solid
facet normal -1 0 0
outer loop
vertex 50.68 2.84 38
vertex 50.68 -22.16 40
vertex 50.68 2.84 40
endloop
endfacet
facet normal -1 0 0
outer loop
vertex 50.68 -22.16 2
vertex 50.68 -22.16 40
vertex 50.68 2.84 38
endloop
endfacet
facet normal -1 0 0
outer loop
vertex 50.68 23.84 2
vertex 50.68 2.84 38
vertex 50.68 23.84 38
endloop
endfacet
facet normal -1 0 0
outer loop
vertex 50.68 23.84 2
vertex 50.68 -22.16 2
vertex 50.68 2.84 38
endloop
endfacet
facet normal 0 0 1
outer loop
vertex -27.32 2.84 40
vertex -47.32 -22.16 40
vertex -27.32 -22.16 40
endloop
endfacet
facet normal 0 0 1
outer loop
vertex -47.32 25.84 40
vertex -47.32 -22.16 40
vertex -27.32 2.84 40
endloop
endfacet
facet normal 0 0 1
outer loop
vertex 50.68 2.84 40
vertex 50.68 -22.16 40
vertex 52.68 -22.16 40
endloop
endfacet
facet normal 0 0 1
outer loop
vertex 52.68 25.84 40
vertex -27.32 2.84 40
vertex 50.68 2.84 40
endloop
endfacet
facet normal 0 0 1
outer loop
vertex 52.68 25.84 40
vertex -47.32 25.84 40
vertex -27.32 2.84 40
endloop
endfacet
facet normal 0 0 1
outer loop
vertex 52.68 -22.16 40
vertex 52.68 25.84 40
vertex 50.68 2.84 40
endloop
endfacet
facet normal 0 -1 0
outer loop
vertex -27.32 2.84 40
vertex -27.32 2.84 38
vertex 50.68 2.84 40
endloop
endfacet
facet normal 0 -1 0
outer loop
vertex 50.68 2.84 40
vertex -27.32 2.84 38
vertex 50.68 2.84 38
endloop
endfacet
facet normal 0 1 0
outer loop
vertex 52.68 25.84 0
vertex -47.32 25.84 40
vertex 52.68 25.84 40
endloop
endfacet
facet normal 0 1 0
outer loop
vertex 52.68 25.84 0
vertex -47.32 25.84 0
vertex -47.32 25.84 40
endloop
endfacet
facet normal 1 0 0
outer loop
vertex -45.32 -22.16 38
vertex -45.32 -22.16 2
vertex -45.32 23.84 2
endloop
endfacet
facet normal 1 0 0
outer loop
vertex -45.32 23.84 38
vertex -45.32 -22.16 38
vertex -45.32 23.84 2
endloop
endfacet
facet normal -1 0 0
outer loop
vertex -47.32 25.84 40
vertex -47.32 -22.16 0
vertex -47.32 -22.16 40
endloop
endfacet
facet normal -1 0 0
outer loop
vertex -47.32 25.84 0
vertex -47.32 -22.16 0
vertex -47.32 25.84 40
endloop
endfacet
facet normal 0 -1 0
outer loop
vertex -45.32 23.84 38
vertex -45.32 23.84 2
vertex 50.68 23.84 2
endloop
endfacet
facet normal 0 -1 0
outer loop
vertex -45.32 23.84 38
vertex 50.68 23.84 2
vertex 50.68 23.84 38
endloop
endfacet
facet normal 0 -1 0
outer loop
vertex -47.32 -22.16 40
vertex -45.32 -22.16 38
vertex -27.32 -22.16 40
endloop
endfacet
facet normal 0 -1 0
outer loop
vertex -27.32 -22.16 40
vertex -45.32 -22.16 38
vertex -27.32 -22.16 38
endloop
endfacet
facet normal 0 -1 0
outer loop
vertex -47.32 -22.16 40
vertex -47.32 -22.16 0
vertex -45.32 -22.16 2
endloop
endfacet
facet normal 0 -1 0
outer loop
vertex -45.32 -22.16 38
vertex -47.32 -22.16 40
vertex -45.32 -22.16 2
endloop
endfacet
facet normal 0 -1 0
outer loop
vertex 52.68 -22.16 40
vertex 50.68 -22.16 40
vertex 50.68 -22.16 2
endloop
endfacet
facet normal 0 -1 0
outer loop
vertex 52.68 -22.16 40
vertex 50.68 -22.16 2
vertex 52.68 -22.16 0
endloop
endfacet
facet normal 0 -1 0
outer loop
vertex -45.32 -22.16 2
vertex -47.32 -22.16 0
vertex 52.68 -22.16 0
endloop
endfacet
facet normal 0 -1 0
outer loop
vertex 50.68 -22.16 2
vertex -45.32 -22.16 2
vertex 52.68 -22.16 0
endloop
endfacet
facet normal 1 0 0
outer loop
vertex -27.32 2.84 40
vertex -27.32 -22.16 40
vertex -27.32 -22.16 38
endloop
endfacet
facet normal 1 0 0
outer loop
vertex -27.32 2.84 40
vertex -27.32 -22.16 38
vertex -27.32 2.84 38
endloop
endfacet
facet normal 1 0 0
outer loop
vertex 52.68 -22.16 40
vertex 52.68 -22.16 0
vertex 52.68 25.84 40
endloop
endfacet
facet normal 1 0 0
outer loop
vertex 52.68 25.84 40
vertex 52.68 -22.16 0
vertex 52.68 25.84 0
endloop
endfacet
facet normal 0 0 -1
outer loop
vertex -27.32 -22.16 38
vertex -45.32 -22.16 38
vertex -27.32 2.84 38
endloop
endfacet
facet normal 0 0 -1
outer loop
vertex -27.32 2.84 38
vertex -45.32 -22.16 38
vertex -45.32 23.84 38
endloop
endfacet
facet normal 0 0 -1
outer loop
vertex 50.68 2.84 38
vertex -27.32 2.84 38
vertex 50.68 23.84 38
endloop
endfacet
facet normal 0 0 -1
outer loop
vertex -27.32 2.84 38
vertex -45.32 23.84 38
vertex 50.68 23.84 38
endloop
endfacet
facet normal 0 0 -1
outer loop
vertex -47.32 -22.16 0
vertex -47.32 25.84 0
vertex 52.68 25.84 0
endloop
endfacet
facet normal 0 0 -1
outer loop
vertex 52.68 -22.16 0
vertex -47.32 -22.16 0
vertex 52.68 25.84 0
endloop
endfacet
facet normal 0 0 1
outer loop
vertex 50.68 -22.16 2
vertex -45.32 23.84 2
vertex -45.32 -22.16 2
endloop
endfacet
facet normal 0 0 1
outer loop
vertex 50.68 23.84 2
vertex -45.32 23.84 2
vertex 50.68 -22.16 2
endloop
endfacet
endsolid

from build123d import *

# Parameters (mm, degrees)
SKETCH1_W           = 100
SKETCH1_H           = 50
BOSS_EXTRUDE1_DEPTH = 40
SHELL1_T            = -2
SKETCH2_W           = 100
SKETCH2_H           = 40
CUT_EXTRUDE1_DEPTH  = 40
SKETCH3_W           = 96
SKETCH3_H           = 21
BOSS_EXTRUDE2_DEPTH = 38
SKETCH4_W           = 20
SKETCH4_H           = 48
BOSS_EXTRUDE3_DEPTH = 2
SHELL2_START        = -45.319513939
SHELL2_OUTLINE_W    = 21
SHELL2_OUTLINE_H    = 36
SHELL2_DEPTH        = 96


# Read off the part's stored shape, not the designer's step: Shell2
with BuildPart() as part:
    # Sketch1 → Boss-Extrude1 (new body)
    with BuildSketch(Plane.XY):
        with Locations((2.680486061, 0.839885633)):
            Rectangle(SKETCH1_W, SKETCH1_H)
    extrude(amount=BOSS_EXTRUDE1_DEPTH)

    # Shell1
    shell1_openings = [part.faces().sort_by_distance(p)[0] for p in [
        (2.680486061, 0.839885633, 40),
    ]]
    offset(amount=SHELL1_T, openings=shell1_openings, kind=Kind.INTERSECTION)

    # Sketch2 → Cut-Extrude1 (cut)
    with BuildSketch(Plane(origin=(0, -22.160114367, 0), x_dir=(1, 0, 0), z_dir=(0, 1, 0))):
        with Locations((2.680486061, -20)):
            Rectangle(SKETCH2_W, SKETCH2_H)
    extrude(amount=-CUT_EXTRUDE1_DEPTH, mode=Mode.SUBTRACT)

    # Sketch3 → Boss-Extrude2 (add)
    with BuildSketch(Plane.XY.offset(2)):
        with Locations((2.680486061, 13.339885633)):
            Rectangle(SKETCH3_W, SKETCH3_H)
    extrude(amount=BOSS_EXTRUDE2_DEPTH)

    # Sketch4 → Boss-Extrude3 (add)
    with BuildSketch(Plane.XY.offset(40)):
        with Locations((-37.319513939, 1.839885633)):
            Rectangle(SKETCH4_W, SKETCH4_H)
    extrude(amount=-BOSS_EXTRUDE3_DEPTH)

    # Shell2 outline → Shell2 (cut)
    with BuildSketch(Plane.YZ.offset(SHELL2_START)):
        with Locations((13.339885633, 20)):
            Rectangle(SHELL2_OUTLINE_W, SHELL2_OUTLINE_H)
    extrude(amount=SHELL2_DEPTH, mode=Mode.SUBTRACT)


solid = part.part
